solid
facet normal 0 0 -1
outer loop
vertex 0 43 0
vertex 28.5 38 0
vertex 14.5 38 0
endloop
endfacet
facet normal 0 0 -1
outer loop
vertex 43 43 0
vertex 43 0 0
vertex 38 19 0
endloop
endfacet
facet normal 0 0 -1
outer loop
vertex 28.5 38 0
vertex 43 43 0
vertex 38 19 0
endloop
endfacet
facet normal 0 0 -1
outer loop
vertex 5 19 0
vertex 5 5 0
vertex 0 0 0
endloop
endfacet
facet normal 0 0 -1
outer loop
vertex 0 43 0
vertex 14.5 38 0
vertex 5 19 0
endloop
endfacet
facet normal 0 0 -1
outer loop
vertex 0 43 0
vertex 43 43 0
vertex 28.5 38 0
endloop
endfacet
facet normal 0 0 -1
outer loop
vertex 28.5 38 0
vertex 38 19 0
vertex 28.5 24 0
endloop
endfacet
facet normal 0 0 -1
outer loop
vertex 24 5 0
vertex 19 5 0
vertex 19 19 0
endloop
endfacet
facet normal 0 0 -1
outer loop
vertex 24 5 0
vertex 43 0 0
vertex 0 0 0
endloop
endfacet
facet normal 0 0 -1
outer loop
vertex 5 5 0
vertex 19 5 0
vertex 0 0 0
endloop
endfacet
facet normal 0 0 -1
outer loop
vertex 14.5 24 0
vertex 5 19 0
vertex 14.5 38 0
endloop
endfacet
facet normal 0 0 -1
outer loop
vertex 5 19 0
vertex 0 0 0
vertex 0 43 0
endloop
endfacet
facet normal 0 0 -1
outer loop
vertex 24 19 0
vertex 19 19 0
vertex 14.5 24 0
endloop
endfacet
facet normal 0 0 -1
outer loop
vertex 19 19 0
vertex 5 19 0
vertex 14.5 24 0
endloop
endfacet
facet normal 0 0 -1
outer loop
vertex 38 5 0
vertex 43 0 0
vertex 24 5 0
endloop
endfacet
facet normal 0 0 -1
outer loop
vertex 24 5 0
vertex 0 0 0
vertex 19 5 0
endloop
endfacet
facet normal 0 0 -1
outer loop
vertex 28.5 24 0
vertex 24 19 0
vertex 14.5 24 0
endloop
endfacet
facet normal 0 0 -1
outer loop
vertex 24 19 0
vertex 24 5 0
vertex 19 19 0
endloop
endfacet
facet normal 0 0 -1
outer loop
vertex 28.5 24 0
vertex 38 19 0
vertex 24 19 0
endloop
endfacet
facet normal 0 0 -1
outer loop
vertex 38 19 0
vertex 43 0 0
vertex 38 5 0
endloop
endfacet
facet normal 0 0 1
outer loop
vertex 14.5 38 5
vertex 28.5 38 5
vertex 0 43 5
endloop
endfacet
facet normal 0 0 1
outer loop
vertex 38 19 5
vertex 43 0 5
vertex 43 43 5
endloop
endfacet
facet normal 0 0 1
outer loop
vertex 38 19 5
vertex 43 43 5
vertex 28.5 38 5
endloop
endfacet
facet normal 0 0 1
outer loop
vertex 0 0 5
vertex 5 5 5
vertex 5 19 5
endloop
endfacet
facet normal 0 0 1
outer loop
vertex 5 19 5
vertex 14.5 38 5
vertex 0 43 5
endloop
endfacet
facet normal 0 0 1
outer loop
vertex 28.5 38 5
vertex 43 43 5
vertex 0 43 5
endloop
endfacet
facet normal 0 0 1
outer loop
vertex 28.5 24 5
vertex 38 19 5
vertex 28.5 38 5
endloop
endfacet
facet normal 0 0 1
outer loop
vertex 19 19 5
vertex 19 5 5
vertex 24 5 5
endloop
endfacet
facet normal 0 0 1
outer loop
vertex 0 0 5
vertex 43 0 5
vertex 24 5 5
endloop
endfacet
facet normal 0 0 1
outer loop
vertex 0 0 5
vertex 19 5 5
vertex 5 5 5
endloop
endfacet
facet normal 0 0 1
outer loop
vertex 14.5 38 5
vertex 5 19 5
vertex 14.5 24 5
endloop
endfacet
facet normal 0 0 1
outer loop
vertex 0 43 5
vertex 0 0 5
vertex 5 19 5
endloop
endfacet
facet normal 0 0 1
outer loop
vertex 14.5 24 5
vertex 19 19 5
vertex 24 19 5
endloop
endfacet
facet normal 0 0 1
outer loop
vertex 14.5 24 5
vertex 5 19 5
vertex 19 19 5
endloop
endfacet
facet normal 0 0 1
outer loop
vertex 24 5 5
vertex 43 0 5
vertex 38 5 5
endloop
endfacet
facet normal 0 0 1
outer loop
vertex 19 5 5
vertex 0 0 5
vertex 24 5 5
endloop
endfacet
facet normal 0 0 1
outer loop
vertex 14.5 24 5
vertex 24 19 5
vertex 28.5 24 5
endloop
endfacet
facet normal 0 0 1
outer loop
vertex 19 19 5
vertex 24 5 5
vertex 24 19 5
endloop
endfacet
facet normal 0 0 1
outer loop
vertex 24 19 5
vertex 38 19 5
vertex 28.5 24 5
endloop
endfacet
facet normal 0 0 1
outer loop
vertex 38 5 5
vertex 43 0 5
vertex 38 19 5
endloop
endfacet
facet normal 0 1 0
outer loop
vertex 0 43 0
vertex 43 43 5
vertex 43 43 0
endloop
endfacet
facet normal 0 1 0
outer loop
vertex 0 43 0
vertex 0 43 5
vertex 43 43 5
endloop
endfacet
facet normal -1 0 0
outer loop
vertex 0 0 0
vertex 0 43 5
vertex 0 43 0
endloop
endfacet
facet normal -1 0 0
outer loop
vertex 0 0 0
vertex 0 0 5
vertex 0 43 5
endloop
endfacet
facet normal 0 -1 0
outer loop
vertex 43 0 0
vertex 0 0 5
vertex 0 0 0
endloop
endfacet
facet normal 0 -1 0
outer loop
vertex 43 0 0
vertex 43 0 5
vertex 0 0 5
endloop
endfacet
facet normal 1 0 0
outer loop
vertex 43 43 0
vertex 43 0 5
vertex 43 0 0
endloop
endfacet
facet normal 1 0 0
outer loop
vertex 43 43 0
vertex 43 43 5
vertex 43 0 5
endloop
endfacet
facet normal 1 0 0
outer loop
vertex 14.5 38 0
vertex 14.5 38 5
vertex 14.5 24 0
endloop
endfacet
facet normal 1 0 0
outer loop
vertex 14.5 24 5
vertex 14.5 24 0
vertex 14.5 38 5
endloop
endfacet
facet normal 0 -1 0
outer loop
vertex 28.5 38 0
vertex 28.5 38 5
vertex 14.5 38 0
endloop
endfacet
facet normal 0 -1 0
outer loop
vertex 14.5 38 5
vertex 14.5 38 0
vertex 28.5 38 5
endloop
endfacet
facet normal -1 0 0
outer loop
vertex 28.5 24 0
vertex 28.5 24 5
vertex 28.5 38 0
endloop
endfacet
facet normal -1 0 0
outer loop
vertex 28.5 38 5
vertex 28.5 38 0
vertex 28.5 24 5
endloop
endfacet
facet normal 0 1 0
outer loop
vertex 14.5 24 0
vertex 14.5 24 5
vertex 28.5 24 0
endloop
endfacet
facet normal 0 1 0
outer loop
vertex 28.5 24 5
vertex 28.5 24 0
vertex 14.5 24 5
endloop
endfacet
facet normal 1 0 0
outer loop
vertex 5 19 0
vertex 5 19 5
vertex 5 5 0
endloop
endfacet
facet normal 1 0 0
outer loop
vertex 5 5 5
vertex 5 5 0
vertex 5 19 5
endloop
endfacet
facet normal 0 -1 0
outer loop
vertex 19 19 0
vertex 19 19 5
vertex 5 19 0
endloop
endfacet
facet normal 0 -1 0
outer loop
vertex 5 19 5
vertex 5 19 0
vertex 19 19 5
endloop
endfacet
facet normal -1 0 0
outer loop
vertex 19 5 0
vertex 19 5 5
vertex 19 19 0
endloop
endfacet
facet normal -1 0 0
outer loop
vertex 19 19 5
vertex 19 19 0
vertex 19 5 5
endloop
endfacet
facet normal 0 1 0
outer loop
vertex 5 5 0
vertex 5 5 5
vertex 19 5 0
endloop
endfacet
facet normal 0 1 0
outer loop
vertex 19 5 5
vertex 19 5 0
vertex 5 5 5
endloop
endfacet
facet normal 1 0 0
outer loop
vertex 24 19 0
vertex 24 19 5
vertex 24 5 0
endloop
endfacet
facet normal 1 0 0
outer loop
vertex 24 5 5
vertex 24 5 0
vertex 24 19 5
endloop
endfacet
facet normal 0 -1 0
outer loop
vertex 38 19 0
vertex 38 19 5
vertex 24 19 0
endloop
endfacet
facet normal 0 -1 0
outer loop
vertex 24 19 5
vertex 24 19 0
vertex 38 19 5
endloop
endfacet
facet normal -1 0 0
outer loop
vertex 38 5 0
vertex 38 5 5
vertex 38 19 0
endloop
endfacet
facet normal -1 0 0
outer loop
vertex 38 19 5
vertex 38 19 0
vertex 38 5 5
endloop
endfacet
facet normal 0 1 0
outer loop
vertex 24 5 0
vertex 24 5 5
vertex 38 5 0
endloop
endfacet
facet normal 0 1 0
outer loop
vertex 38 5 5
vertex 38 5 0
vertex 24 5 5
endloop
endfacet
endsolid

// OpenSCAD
linear_extrude(5)
difference() {
    square(43);
    translate([14.5, 24])
    square(14);
    translate([5, 5])
    square(14);
    translate([24, 5])
    square(14);
}
